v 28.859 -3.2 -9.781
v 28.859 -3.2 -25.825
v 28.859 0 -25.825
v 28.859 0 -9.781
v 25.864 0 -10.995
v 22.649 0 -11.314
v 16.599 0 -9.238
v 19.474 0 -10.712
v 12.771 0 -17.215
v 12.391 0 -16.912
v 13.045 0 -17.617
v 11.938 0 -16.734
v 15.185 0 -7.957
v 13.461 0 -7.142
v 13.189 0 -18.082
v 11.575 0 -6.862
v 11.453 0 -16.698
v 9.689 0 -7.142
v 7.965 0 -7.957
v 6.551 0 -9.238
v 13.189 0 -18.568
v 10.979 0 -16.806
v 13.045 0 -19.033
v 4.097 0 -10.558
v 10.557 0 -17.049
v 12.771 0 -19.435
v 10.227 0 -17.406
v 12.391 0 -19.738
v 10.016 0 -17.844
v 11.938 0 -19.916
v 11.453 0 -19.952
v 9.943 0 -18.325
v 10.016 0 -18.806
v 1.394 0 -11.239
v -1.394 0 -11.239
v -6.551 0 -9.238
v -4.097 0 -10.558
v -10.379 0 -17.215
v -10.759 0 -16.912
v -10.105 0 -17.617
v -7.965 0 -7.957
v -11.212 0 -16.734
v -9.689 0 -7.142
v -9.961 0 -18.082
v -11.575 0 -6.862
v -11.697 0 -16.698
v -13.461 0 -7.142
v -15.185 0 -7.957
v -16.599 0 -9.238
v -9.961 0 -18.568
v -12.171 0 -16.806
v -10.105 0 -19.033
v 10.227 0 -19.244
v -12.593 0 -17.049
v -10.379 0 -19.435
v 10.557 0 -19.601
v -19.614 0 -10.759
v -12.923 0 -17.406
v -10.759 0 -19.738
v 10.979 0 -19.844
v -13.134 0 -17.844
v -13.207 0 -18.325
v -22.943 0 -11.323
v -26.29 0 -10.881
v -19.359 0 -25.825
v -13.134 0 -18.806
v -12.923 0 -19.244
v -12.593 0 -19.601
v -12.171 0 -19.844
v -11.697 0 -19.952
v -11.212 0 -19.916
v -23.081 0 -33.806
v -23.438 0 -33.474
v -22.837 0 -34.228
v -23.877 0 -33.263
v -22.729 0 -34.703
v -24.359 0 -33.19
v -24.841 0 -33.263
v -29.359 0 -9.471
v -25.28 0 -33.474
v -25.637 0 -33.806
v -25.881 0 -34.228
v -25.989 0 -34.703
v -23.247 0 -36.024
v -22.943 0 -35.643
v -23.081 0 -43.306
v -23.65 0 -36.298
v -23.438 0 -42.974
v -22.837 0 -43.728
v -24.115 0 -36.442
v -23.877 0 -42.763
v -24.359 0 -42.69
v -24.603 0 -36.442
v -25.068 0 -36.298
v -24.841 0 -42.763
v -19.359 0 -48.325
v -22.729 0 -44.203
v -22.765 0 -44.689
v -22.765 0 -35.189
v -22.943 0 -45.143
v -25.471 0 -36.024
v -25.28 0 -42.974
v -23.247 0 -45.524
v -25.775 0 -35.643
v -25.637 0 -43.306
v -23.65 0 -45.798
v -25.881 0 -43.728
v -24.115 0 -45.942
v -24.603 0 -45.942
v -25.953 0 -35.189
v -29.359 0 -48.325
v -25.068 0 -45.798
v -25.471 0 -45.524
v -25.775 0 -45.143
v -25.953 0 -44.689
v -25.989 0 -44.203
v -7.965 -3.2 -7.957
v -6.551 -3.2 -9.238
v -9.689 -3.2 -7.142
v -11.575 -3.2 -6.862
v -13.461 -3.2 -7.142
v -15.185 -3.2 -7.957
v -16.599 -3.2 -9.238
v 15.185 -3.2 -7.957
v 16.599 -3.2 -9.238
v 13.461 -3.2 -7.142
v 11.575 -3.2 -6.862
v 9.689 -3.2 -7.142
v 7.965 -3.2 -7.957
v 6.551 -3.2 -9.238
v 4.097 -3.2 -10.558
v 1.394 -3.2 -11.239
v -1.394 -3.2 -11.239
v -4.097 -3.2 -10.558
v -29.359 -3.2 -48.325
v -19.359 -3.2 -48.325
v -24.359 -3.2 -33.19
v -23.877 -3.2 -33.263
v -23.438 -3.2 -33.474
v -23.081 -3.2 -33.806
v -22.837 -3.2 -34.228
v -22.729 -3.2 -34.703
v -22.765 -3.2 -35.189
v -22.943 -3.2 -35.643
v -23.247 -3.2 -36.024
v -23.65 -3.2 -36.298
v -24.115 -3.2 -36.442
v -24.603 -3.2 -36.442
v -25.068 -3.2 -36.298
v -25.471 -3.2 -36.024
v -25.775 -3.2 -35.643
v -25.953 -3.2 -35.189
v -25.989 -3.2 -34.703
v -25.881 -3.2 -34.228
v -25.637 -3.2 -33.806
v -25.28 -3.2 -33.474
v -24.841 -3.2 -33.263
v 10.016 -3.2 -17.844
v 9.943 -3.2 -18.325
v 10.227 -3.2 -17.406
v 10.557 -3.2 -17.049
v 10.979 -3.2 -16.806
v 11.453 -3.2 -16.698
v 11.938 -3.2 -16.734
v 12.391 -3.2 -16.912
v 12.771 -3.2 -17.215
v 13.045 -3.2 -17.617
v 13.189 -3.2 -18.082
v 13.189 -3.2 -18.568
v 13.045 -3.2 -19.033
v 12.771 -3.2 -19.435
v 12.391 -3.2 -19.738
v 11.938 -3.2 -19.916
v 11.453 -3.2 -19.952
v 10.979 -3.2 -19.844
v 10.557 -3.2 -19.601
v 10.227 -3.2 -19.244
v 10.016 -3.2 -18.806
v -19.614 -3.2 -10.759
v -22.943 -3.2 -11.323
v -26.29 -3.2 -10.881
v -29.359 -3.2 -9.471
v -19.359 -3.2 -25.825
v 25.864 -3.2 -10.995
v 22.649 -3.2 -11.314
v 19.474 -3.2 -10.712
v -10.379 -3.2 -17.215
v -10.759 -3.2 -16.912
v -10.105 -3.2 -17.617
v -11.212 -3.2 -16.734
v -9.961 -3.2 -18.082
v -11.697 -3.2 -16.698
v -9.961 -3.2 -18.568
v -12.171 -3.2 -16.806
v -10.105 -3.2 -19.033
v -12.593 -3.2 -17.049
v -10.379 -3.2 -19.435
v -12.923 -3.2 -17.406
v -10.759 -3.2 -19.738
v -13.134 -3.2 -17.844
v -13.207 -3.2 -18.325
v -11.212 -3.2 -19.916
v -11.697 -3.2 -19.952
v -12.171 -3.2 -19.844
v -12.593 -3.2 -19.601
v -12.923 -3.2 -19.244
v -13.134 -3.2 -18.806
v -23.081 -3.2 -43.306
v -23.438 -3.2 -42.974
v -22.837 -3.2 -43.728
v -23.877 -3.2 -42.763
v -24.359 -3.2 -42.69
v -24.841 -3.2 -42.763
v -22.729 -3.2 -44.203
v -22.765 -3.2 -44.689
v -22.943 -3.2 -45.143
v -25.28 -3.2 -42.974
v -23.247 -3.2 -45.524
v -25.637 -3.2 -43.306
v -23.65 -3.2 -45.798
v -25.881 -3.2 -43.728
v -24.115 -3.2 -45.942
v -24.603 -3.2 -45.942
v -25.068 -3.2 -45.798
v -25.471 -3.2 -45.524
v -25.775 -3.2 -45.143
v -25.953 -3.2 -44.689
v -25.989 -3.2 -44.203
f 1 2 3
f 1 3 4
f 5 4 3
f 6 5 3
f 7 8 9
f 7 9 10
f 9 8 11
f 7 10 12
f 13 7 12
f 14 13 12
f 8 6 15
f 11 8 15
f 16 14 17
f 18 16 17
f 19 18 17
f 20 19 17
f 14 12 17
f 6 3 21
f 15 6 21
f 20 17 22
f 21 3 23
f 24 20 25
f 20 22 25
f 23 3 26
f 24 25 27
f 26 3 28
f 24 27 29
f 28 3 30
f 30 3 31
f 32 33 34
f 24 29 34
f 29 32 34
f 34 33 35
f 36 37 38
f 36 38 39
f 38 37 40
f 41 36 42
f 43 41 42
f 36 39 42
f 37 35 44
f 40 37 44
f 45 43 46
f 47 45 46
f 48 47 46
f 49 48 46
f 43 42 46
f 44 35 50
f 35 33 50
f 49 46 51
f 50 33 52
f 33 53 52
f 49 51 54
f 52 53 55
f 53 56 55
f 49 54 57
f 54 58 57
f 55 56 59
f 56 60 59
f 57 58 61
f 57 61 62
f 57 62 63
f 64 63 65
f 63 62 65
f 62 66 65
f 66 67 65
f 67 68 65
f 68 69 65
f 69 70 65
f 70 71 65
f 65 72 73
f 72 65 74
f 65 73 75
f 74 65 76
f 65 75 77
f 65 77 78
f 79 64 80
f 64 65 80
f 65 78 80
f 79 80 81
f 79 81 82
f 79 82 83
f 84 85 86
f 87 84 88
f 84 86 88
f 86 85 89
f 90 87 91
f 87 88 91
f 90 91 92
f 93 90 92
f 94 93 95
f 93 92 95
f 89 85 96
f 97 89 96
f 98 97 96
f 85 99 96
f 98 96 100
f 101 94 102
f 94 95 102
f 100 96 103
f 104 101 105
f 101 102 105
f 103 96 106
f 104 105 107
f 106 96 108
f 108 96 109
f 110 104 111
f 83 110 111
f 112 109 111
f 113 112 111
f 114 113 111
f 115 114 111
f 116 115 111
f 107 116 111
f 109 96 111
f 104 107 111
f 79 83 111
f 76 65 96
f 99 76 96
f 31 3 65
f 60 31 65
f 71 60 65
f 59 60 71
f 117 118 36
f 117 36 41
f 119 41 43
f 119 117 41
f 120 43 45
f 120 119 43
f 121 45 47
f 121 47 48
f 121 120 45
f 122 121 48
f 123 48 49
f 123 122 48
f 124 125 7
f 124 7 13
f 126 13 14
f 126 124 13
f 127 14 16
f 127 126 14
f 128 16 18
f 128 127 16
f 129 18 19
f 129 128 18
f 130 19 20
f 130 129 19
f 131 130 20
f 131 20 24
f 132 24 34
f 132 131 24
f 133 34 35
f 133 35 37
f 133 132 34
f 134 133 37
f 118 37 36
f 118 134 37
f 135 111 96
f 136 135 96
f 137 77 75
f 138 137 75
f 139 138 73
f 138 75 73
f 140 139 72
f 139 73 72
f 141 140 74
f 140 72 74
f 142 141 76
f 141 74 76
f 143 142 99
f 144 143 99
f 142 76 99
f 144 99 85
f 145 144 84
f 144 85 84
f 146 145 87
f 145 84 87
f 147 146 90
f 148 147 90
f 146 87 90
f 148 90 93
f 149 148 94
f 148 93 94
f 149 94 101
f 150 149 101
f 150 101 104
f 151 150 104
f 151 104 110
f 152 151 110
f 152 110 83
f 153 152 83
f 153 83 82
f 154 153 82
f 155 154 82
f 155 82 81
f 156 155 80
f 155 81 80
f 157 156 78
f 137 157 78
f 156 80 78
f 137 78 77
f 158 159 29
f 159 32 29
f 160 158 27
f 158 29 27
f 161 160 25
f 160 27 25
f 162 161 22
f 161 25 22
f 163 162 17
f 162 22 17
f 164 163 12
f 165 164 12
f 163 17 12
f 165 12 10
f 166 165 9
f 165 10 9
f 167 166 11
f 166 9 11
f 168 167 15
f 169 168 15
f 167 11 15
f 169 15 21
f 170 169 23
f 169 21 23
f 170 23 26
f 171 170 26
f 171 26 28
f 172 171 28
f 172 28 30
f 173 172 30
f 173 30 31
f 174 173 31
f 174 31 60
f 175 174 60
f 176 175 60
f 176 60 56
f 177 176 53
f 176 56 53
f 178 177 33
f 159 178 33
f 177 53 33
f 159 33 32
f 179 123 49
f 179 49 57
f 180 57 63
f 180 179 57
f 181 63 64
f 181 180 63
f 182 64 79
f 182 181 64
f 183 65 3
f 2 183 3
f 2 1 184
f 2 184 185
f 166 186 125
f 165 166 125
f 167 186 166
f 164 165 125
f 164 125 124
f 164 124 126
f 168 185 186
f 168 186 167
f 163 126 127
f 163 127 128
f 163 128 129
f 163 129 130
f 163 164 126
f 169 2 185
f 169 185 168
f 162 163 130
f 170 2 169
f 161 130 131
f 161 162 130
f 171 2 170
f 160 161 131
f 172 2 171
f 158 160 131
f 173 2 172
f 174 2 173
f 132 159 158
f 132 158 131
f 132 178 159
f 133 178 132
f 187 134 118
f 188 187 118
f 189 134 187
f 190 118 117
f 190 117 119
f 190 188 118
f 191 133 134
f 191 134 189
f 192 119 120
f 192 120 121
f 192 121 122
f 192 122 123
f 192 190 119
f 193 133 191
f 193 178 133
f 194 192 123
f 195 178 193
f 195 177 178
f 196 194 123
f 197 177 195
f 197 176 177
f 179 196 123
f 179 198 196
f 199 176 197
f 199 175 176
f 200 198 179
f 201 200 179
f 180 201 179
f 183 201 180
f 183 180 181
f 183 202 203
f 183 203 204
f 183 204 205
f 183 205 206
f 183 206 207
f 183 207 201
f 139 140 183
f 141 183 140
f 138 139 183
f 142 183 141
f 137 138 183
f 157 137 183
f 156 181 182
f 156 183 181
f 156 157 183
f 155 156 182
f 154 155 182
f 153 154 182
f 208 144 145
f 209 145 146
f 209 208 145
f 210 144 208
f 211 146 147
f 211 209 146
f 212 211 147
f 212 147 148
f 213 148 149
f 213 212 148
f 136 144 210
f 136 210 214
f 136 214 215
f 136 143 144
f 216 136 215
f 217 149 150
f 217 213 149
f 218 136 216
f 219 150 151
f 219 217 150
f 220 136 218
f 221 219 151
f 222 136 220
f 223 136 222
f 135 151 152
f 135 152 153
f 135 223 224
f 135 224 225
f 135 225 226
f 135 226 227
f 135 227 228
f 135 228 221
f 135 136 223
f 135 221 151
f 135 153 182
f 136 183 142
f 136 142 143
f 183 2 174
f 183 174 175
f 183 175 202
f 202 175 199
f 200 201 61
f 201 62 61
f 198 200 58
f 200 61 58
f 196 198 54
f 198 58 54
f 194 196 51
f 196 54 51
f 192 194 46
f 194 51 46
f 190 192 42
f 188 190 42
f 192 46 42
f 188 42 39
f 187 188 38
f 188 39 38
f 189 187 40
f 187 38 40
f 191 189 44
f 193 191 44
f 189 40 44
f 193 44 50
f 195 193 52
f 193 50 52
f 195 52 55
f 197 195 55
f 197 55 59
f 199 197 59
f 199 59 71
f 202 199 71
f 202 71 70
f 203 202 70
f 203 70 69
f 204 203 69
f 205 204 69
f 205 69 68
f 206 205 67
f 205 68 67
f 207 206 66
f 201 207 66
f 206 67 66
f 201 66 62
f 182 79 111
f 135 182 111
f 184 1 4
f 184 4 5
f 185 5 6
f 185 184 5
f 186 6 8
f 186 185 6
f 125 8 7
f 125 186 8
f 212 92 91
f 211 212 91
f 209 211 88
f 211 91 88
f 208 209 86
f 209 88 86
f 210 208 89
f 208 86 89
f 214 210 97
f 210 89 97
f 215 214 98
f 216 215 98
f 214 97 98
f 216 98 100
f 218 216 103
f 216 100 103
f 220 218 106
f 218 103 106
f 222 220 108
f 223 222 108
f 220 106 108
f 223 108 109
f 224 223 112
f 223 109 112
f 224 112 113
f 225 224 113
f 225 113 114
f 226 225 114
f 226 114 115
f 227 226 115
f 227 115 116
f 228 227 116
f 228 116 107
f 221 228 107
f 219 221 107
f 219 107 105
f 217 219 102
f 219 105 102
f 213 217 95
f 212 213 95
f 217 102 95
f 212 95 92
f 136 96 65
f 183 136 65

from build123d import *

# Parameters (mm, degrees)
BASE_FLANGE1_DEPTH        = 3.2
SKETCH8_R                 = 1.635
CUT_EXTRUDE1_DEPTH        = 3.2
F_4_CLEARANCE_HOLE2_D     = 3.2639
F_4_CLEARANCE_HOLE2_DEPTH = 3.2
F_4_CLEARANCE_HOLE2_TIP   = 0.980574487
CUT_EXTRUDE2_DEPTH        = 3.2


# Sheet-metal steps are written as plain solids
with BuildPart() as part:
    # Sketch3 → Base-Flange1 (new body)
    with BuildSketch(Plane(origin=(0, 0, 0), x_dir=(1, 0, 0), z_dir=(0, 1, 0))):
        with BuildLine():
            Line((-29.358964924, 8.867320879), (-29.358964924, 25.825))
            Line((-29.358964924, 25.825), (-29.358964924, 48.325))
            Line((-29.358964924, 48.325), (-19.358964924, 48.325))
            Line((-19.358964924, 48.325), (-19.358964924, 25.825))
            Line((-19.358964924, 25.825), (29.358964924, 25.825))
            Line((29.358964924, 25.825), (29.358964924, 8.867320879))
            ThreePointArc((29.358964924, 8.867320879), (23.15, 10.825), (16.941035076, 8.867320879))
            ThreePointArc((16.941035076, 8.867320879), (11.575, 6.362392354), (6.208964924, 8.867320879))
            ThreePointArc((6.208964924, 8.867320879), (0, 10.825), (-6.208964924, 8.867320879))
            ThreePointArc((-6.208964924, 8.867320879), (-11.575, 6.362392354), (-16.941035076, 8.867320879))
            ThreePointArc((-16.941035076, 8.867320879), (-23.15, 10.825), (-29.358964924, 8.867320879))
        make_face()
    extrude(amount=-BASE_FLANGE1_DEPTH)

    # Sketch8 → Cut-Extrude1 (cut)
    with BuildSketch(Plane(origin=(0, 0, 0), x_dir=(1, 0, 0), z_dir=(0, 1, 0))):
        with Locations(Location((-24.358964924, 44.325, 0), (0, 0, 270))):
            Circle(SKETCH8_R)
        with Locations(Location((-24.358964924, 34.825, 0), (0, 0, 270))):
            Circle(SKETCH8_R)
    extrude(amount=-CUT_EXTRUDE1_DEPTH, mode=Mode.SUBTRACT)

    # #4 Clearance Hole2
    with Locations(Plane.XZ.offset(3.2)):
        with Locations((11.575, -18.325), (-11.575, -18.325)):
            Hole(F_4_CLEARANCE_HOLE2_D / 2, depth=F_4_CLEARANCE_HOLE2_DEPTH)
            with Locations((0, 0, -(F_4_CLEARANCE_HOLE2_DEPTH + F_4_CLEARANCE_HOLE2_TIP / 2))):  # 118° drill point
                Cone(0, F_4_CLEARANCE_HOLE2_D / 2, F_4_CLEARANCE_HOLE2_TIP, mode=Mode.SUBTRACT)

    # Sketch11 → Cut-Extrude2 (cut)
    with BuildSketch(Plane.XZ.offset(3.2)):
        with BuildLine():
            Line((-29.645753142, -9.276896902), (-29.645753142, -3.891418545))
            Line((-29.645753142, -3.891418545), (33.433786827, -3.891418545))
            Line((33.433786827, -3.891418545), (33.433786827, -25.825))
            Line((33.433786827, -25.825), (28.858964924, -25.825))
            Line((28.858964924, -25.825), (28.858964924, -9.780764004))
            ThreePointArc((28.858964924, -9.780764004), (22.648874034, -11.313907272), (16.598650974, -9.237718925))
            ThreePointArc((16.598650974, -9.237718925), (11.575, -6.862392354), (6.551349026, -9.237718925))
            ThreePointArc((6.551349026, -9.237718925), (0, -11.325), (-6.551349026, -9.237718925))
            ThreePointArc((-6.551349026, -9.237718925), (-11.575, -6.862392354), (-16.598650974, -9.237718925))
            ThreePointArc((-16.598650974, -9.237718925), (-23.115993323, -11.324948942), (-29.645753142, -9.276896902))
        make_face()
    extrude(amount=-CUT_EXTRUDE2_DEPTH, mode=Mode.SUBTRACT)


solid = part.part
